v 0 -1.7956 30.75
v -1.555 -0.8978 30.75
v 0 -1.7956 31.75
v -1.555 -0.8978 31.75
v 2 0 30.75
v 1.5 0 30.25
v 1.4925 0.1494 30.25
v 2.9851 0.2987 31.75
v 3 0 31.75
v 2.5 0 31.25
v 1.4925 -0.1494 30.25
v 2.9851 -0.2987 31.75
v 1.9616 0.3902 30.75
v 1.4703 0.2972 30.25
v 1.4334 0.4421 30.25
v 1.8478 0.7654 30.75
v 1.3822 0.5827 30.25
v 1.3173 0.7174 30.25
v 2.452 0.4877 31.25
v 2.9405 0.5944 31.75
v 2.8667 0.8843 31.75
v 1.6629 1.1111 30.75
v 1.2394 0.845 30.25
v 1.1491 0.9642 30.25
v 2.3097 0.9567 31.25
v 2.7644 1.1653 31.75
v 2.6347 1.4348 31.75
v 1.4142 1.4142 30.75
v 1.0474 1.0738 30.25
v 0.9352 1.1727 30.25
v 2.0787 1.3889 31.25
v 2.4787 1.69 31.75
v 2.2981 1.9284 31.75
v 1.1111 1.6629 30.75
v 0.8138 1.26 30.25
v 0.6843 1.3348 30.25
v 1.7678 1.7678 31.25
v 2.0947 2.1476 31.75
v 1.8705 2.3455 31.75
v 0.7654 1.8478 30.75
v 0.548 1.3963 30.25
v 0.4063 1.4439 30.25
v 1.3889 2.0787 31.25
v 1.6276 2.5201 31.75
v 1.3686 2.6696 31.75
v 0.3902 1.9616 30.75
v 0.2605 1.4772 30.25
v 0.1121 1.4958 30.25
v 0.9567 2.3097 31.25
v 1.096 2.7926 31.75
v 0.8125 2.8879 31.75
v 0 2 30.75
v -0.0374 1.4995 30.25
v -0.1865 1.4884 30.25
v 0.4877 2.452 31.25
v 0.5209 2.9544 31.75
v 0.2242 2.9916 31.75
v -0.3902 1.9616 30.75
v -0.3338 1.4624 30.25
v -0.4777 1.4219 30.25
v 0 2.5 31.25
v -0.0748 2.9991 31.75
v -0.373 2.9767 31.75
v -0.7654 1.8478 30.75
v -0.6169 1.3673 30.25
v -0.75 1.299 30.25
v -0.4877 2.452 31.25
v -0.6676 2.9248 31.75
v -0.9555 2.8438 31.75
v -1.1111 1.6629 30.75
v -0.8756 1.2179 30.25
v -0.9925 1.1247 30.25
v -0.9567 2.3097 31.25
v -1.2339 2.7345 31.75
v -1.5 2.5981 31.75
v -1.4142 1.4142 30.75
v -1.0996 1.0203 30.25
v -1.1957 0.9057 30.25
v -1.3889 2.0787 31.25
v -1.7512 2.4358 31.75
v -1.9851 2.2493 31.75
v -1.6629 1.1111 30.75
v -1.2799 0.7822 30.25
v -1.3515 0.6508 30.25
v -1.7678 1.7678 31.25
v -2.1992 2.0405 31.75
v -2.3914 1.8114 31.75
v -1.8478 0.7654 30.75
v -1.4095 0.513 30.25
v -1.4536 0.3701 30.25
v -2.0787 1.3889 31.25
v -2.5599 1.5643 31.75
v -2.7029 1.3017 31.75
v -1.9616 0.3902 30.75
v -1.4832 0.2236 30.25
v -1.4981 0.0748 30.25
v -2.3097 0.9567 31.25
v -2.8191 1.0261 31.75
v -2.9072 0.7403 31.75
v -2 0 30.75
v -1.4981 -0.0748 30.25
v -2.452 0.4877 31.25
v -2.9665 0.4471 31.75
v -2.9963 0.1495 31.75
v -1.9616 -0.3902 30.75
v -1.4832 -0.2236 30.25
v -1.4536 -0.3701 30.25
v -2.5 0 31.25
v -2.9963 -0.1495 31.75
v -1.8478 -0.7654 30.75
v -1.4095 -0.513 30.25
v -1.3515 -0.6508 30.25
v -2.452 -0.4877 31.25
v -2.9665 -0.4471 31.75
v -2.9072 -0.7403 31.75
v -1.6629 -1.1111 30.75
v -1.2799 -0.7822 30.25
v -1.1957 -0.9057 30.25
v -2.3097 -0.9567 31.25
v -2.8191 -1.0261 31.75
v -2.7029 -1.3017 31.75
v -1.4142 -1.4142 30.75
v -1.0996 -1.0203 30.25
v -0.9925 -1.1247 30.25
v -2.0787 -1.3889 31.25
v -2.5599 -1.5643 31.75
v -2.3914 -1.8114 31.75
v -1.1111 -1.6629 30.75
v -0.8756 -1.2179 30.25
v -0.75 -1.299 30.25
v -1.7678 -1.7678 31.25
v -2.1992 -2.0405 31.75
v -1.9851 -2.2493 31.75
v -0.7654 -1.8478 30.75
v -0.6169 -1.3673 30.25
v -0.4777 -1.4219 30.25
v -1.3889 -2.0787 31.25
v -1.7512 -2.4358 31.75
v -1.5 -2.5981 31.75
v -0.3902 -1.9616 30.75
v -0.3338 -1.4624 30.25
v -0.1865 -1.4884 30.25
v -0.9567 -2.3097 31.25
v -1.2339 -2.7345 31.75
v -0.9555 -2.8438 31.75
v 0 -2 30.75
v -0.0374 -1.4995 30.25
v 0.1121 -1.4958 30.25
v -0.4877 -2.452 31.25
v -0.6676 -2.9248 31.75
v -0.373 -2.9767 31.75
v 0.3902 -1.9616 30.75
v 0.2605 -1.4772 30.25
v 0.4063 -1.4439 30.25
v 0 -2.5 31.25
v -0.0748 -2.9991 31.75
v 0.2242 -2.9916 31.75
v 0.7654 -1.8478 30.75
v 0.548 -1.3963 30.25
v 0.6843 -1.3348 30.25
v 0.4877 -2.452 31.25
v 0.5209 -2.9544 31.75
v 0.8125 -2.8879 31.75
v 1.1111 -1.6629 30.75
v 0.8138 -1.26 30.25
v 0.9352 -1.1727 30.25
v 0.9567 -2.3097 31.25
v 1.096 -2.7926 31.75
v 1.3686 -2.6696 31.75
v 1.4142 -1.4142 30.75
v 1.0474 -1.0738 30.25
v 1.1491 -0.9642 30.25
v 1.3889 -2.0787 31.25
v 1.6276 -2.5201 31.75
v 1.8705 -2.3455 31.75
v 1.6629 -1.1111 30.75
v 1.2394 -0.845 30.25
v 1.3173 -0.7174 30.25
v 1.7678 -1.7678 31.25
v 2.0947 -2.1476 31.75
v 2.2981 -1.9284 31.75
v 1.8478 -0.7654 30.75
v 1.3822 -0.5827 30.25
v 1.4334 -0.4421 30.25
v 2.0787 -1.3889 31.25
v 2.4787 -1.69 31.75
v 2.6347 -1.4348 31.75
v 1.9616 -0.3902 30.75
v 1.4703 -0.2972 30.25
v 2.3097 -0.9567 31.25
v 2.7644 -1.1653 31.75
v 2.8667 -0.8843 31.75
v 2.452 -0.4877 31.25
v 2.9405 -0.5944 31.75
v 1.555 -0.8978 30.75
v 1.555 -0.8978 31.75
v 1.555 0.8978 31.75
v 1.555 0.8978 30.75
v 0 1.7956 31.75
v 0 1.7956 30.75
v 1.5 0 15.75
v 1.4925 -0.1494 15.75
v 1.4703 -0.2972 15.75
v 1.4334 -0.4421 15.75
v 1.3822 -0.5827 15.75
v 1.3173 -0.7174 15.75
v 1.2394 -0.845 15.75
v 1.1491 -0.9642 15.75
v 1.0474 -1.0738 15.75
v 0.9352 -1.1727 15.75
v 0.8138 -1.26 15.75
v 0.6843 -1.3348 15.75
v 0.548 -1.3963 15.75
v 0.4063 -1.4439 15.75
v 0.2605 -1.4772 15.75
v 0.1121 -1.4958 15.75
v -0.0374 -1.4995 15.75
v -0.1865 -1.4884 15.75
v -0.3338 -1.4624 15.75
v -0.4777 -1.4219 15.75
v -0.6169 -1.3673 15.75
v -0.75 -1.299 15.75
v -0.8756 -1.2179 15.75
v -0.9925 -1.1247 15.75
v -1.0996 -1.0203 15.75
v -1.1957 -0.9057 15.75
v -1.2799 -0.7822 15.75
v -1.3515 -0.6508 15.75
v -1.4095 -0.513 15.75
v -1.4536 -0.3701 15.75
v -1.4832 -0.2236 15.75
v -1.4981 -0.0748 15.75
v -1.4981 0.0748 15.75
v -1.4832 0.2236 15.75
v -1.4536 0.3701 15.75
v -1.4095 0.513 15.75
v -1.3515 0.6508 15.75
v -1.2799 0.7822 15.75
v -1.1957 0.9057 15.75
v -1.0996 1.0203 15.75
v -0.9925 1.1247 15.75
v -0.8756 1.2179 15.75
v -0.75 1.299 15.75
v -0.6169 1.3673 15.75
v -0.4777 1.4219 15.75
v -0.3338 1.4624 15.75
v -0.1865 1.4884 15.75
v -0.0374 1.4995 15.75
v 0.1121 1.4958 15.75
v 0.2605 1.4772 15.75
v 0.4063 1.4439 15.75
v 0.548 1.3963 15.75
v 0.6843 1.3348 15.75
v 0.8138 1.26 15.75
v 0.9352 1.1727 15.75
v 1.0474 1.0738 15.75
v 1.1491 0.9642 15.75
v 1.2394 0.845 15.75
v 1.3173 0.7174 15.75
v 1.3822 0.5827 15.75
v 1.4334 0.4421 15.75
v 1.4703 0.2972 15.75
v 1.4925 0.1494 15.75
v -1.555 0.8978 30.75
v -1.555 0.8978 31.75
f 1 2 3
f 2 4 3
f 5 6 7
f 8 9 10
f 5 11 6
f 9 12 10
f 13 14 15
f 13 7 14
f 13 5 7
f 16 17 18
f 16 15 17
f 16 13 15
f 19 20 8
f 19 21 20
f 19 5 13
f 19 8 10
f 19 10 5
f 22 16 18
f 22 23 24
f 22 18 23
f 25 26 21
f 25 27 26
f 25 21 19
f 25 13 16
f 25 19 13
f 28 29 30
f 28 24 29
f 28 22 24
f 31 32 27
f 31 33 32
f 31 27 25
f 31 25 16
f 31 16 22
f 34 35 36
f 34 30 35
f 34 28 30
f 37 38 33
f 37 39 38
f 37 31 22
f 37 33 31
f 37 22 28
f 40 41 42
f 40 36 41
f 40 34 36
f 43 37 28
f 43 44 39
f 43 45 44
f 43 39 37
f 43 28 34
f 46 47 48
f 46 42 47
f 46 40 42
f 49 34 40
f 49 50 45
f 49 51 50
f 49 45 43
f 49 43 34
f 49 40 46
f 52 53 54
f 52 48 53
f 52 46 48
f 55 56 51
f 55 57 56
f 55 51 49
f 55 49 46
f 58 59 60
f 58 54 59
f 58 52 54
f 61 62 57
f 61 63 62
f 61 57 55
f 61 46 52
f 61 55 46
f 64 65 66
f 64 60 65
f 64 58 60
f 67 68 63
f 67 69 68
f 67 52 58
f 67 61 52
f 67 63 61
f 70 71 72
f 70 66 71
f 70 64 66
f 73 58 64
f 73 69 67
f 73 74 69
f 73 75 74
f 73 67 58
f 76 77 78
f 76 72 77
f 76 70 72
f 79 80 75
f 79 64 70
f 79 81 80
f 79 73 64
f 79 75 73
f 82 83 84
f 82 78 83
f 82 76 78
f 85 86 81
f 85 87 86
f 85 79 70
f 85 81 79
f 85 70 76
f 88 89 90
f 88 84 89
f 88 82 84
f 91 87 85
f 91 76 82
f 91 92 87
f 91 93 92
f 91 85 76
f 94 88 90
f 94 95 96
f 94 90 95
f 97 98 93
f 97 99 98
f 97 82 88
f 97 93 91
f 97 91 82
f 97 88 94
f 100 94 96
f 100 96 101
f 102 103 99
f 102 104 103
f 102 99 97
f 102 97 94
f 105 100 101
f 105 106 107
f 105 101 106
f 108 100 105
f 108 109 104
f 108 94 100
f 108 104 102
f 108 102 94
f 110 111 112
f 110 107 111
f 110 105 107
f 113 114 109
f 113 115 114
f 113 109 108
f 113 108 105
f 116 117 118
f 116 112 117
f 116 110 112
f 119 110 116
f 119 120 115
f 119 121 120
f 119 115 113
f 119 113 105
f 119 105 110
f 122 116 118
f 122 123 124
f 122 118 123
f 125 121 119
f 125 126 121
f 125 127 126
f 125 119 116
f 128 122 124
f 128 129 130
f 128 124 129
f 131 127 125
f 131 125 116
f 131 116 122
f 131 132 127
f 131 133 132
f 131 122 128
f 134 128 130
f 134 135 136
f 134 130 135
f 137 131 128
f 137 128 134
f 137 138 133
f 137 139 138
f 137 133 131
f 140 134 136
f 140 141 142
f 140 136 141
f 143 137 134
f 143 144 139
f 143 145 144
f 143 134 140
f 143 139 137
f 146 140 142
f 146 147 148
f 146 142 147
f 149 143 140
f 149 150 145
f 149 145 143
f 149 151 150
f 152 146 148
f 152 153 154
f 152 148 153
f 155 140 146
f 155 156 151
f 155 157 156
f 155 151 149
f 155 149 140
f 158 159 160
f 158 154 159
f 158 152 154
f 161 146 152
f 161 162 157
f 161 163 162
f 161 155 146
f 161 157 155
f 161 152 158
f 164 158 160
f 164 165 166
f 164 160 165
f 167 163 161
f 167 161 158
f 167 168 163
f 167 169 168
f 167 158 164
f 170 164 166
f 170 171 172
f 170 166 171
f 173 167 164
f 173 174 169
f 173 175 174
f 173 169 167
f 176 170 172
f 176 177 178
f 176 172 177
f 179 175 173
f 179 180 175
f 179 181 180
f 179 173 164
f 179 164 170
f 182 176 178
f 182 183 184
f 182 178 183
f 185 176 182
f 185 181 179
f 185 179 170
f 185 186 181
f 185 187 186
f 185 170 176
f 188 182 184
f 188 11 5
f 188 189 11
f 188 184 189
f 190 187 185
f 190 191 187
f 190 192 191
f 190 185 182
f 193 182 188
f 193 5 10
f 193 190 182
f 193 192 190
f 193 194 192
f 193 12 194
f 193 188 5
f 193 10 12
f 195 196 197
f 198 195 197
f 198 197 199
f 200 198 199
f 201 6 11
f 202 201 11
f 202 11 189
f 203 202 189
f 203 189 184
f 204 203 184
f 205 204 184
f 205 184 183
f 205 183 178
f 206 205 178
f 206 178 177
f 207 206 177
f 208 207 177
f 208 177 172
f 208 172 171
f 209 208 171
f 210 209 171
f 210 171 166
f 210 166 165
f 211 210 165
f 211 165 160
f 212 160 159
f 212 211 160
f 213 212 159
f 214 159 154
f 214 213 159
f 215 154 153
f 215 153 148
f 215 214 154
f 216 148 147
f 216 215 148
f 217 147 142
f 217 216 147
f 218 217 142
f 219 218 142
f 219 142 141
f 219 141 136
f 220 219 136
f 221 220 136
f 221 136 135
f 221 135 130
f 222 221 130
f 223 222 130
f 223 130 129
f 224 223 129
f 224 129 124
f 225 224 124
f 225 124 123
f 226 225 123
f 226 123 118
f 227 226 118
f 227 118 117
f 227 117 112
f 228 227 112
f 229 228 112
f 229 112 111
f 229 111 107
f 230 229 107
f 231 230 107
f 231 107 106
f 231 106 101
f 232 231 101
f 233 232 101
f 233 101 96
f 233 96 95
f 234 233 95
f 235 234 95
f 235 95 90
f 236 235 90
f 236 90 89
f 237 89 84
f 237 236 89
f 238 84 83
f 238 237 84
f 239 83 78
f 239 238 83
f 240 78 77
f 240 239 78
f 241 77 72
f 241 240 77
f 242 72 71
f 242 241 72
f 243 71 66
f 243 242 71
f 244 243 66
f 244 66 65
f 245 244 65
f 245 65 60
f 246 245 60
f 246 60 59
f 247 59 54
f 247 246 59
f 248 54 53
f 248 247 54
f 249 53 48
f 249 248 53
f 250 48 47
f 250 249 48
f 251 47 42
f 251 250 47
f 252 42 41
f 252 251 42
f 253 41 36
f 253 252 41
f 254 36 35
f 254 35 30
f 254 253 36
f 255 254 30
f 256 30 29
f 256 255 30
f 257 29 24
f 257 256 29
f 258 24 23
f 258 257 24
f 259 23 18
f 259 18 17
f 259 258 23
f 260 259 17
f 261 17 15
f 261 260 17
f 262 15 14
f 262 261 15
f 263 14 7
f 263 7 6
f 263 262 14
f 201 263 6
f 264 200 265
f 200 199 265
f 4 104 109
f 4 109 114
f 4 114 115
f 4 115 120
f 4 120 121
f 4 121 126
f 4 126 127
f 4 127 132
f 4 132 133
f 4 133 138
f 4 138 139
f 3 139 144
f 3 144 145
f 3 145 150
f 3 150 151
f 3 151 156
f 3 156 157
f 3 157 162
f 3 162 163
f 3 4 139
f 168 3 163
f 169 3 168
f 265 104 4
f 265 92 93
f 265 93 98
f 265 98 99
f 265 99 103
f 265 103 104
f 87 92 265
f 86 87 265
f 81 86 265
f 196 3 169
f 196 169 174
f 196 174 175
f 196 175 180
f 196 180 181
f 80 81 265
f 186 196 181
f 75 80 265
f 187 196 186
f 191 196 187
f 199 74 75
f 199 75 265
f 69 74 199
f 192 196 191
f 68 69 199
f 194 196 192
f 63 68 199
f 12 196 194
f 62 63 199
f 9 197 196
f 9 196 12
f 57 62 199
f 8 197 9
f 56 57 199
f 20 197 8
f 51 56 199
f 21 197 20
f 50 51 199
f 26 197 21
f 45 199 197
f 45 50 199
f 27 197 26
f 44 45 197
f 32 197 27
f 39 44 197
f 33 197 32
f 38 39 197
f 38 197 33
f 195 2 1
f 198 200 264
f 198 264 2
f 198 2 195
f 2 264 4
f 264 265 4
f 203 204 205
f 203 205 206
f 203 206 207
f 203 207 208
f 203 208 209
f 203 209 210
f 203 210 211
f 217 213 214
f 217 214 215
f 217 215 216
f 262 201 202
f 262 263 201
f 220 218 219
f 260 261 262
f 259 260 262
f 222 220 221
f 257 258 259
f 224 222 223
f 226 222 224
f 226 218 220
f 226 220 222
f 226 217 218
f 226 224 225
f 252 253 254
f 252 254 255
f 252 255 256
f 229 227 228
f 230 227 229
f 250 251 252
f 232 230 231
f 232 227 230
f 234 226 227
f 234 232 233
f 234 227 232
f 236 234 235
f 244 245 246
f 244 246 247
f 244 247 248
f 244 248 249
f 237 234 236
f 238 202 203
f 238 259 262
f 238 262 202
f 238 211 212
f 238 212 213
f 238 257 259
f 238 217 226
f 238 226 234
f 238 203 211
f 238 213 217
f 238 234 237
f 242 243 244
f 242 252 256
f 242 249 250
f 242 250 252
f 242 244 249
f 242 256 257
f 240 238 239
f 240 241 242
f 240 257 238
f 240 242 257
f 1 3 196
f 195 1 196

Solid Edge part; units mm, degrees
sketch "Sketch1" plane through (0, 0, 0) normal (0, 0, 1) x (1, 0, 0)
  circle A0 centre (0, 0) radius 1.5
extrude "Protrusion1" add sketch "Sketch1" along normal blind 30
sketch "Sketch2" plane through (0, 0, 30) normal (0, 0, 1) x (1, 0, 0)
  circle A0 centre (0, 0) radius 3
extrude "ExtrudedProtrusion_2" add sketch "Sketch2" along normal blind 1.75
chamfer "Chamfer_1" distance 1.75 angle 45 1 edges at (-3, 0, 30)
sketch "Sketch3" plane through (0, 0, 31.75) normal (0, 0, 1) x (0, 1, 0)
  line L0 (0.8978, -1.555) -> (1.7956, 0)
  line L1 (1.7956, 0) -> (0.8978, 1.555)
  line L2 (0.8978, 1.555) -> (-0.8978, 1.555)
  line L3 (-0.8978, 1.555) -> (-1.7956, 0)
  line L4 (-1.7956, 0) -> (-0.8978, -1.555)
  line L5 (-0.8978, -1.555) -> (0.8978, -1.555)
extrude "ExtrudedCutout_1" cut sketch "Sketch3" against normal blind 1
sketch "Sketch4" plane through (0, 0, 0) normal (0, 0, -1) x (0, 1, 0)
  circle A0 centre (0, 0) radius 1.9215
extrude "ExtrudedCutout_2" cut sketch "Sketch4" against normal blind 15.75
properties material "Iron, grey cast type 20"
